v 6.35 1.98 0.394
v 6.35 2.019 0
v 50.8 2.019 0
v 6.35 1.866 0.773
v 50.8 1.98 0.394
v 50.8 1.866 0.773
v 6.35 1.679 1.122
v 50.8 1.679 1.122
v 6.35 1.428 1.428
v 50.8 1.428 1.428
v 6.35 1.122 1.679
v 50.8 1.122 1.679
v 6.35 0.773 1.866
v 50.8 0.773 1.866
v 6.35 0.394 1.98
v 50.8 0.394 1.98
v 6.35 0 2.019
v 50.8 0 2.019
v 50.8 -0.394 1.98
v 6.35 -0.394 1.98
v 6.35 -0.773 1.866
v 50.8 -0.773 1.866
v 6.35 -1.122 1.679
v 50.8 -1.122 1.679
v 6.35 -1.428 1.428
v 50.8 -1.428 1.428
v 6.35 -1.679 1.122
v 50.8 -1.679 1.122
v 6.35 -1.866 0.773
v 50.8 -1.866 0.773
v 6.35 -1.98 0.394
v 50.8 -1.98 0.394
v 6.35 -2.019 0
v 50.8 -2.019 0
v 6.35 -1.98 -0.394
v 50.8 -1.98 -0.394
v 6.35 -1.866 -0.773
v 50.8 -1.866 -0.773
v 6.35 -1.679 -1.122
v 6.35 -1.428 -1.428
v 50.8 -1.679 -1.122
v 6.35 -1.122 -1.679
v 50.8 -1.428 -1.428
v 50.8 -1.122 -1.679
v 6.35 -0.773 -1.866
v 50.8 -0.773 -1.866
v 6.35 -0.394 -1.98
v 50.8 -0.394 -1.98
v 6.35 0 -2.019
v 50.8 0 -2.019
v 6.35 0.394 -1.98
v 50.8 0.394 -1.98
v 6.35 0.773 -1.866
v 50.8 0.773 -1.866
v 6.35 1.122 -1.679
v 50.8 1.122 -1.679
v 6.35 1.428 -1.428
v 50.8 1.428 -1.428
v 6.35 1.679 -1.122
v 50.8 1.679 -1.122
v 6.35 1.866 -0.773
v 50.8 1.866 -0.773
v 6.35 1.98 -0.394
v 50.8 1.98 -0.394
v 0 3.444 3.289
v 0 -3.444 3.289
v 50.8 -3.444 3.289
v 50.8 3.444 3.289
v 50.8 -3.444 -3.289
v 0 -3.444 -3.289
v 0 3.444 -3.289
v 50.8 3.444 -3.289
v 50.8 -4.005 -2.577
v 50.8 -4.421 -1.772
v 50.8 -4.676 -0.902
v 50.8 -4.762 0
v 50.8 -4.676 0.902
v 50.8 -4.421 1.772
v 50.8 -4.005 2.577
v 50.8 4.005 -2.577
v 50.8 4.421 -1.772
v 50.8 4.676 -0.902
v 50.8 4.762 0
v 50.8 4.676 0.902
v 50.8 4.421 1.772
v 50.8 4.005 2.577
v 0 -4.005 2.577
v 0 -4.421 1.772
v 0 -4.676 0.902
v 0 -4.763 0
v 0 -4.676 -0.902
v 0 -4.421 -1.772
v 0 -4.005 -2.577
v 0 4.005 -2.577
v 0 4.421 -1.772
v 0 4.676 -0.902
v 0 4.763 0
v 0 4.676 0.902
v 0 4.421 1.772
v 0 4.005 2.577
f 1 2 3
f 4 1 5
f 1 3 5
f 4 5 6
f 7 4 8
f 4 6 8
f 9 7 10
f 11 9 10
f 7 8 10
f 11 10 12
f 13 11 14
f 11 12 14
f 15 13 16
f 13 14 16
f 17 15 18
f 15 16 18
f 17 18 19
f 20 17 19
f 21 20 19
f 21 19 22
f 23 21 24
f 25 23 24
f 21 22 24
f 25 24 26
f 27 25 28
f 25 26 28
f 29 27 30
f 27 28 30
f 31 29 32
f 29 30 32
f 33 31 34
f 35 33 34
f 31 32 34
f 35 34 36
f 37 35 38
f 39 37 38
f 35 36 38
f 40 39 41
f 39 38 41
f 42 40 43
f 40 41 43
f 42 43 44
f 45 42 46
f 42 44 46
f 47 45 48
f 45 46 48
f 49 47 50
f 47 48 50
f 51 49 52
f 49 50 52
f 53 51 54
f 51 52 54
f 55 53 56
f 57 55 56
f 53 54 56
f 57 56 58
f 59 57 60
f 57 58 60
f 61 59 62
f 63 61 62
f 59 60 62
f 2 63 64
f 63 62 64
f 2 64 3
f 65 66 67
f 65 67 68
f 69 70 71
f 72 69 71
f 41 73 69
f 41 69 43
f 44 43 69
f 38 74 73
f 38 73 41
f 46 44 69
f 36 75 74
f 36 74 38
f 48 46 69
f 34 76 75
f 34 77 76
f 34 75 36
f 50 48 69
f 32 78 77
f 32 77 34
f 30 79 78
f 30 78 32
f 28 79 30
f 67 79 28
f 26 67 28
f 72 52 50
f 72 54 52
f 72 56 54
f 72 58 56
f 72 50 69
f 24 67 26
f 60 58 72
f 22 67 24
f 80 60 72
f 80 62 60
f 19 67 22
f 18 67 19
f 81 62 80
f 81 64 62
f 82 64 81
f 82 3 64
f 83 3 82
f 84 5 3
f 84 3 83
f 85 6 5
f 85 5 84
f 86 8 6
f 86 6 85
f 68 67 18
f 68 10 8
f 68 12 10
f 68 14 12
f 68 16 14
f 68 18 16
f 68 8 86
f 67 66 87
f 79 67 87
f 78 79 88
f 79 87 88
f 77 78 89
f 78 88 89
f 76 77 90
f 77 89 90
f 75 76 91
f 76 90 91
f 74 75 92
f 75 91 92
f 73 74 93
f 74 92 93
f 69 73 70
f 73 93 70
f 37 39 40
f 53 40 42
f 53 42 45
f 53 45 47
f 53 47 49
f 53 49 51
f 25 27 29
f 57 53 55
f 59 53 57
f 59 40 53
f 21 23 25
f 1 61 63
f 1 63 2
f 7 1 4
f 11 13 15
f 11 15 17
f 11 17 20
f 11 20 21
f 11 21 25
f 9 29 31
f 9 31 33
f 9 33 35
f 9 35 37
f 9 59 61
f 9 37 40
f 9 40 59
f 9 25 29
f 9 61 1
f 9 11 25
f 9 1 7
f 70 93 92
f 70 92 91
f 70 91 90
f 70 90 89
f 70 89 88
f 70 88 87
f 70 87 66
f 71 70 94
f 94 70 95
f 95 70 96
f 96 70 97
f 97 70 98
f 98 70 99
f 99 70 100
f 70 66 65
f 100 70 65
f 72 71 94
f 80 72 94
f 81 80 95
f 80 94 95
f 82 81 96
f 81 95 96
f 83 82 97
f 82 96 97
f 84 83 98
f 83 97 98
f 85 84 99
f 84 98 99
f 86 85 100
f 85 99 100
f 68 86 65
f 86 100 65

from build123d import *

# Parameters (mm, degrees)
F0_R     = 4.7625
F1_DEPTH = 50.8
F3_DEPTH = 50.801
F4_R     = 2.0193
F5_DEPTH = 44.45


# Not quite as in the source:
# - a pattern or mirror of a feature is missing from the dataset's text; its kind, count and spacing are read off the source's solid


with BuildPart() as f1:
    # F0 (on Right) → F1 (new body)
    with BuildSketch(Plane.YZ):
        Circle(F0_R)
    extrude(amount=F1_DEPTH)

    # F2 (on face) → F3 (cut, through all)
    with BuildSketch(Plane.YZ.offset(50.8)):
        with BuildLine():
            Line((-3.444112623, 3.2893), (3.444112623, 3.2893))
            ThreePointArc((3.444112623, 3.2893), (0, 4.7625), (-3.444112623, 3.2893))
        make_face()
    f3 = extrude(amount=-F3_DEPTH, mode=Mode.SUBTRACT)

    # F3_copies: F3 across plane
    add(f3.mirror(Plane(origin=(0, 0, 0), x_dir=(-1, 0, 0), z_dir=(0, 0, -1))), mode=Mode.SUBTRACT)

    # F4 (on face) → F5 (cut)
    with BuildSketch(Plane.YZ.offset(50.8)):
        Circle(F4_R)
    extrude(amount=-F5_DEPTH, mode=Mode.SUBTRACT)


solid = f1.part
